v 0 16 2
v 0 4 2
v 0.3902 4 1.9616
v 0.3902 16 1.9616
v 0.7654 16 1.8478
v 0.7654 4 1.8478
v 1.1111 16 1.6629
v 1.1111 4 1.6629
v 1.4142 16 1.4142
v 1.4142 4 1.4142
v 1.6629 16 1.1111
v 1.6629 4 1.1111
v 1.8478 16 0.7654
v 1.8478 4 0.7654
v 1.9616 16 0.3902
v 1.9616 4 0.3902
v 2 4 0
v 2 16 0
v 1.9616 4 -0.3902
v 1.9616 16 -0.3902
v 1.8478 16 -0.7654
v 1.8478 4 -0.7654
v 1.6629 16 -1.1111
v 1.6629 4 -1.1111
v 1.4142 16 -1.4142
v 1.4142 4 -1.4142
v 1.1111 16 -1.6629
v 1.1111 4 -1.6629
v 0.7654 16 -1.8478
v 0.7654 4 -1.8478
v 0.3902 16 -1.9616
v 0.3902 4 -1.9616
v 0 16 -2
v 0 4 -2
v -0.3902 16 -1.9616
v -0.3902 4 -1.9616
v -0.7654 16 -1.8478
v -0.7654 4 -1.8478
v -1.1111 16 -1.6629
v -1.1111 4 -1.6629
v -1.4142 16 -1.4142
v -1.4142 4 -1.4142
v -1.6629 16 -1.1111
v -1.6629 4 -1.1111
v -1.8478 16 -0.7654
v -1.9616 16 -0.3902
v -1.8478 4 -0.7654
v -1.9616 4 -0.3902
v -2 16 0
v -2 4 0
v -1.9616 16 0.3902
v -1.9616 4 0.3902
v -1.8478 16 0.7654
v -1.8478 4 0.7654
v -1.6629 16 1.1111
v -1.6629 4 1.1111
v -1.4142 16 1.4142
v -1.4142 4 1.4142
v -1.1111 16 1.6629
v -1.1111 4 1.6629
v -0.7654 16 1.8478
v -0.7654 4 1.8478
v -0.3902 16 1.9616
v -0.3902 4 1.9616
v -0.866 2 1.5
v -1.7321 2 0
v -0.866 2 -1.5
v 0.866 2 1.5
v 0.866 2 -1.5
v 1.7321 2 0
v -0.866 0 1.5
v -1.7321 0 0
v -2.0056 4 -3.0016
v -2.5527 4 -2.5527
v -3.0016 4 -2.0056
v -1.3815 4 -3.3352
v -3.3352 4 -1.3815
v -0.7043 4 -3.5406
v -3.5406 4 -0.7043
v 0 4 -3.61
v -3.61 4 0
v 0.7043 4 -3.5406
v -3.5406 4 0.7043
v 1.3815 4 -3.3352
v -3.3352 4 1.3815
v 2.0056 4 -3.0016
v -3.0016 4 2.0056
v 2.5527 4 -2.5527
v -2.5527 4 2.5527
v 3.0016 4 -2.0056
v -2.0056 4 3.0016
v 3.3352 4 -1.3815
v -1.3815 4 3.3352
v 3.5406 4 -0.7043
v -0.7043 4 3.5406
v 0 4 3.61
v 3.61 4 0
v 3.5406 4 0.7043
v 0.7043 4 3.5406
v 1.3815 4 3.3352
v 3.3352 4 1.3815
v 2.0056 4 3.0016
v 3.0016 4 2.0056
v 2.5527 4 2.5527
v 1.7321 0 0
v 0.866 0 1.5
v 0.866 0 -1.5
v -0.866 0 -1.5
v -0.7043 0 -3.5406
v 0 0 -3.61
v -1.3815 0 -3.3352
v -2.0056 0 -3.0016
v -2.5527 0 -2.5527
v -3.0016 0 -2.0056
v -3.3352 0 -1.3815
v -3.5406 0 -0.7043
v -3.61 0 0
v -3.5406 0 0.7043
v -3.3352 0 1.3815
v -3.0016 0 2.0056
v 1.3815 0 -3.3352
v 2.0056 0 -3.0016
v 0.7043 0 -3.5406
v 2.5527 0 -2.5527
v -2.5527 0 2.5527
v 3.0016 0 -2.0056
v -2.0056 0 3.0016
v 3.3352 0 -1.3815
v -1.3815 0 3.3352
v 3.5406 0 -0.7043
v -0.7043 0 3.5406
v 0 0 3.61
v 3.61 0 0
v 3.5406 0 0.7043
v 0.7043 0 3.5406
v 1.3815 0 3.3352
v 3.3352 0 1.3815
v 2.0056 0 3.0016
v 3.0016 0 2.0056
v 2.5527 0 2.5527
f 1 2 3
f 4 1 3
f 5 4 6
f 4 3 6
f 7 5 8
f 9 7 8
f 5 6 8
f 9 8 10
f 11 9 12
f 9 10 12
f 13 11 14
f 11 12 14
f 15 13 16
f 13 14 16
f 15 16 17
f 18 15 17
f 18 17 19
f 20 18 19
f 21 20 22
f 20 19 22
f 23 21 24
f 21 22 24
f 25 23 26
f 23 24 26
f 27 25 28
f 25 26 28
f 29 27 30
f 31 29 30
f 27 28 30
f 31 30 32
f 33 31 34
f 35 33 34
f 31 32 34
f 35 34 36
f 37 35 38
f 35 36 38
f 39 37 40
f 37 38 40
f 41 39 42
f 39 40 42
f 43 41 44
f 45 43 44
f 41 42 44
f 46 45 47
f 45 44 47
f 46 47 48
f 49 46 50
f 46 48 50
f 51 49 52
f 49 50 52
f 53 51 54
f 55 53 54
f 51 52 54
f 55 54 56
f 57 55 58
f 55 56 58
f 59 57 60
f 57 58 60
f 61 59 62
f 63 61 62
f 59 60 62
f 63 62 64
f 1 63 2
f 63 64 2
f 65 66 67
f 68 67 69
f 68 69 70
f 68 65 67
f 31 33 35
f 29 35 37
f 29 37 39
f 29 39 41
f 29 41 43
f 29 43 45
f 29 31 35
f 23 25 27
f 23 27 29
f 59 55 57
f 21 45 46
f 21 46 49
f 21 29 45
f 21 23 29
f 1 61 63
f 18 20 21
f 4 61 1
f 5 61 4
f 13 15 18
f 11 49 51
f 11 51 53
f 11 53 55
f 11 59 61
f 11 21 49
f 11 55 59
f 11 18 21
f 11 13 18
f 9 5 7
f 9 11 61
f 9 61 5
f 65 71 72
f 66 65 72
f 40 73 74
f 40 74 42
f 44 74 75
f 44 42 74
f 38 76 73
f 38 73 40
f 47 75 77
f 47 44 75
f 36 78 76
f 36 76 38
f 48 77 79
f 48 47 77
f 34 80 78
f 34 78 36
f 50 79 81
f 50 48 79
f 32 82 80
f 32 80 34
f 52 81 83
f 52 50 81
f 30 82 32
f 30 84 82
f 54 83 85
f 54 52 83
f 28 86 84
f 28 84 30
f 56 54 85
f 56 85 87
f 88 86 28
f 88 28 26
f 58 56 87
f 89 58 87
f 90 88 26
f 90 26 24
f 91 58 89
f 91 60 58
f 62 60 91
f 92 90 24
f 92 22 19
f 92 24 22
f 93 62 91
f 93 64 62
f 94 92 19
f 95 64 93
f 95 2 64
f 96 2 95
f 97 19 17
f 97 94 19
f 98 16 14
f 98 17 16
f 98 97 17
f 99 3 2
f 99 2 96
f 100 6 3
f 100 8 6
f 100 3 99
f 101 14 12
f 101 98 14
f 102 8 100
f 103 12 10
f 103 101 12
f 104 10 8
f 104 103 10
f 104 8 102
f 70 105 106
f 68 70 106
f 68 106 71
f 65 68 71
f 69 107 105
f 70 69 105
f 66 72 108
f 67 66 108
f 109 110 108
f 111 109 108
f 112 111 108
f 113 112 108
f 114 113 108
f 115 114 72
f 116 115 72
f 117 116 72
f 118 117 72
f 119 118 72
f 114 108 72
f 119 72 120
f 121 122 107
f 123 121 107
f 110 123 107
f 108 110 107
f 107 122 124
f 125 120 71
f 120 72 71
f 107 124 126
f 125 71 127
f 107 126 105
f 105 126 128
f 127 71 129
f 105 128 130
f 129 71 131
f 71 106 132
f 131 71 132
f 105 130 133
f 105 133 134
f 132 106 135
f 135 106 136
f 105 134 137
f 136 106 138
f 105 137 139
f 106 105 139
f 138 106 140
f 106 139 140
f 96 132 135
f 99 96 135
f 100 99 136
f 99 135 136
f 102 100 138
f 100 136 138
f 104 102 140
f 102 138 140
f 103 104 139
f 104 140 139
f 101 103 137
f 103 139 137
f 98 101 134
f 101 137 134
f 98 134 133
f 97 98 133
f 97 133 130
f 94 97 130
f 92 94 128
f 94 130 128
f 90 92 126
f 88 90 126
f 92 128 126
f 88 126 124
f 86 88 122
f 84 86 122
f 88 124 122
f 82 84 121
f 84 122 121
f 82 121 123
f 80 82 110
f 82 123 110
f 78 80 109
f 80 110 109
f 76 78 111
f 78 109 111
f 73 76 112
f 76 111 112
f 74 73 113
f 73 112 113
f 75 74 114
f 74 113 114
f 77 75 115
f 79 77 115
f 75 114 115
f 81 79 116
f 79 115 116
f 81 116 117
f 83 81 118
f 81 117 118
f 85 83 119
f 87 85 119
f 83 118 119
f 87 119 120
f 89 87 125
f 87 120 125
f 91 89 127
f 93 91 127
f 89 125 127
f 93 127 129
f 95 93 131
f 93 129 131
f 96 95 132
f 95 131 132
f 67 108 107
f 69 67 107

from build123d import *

# Parameters (mm, degrees)
SKETCH_1_R          = 3.61
EXTRUDE_1_DEPTH     = 4
CUT_EXTRUDE_1_DEPTH = 2
SKETCH_3_R          = 2
EXTRUDE_2_DEPTH     = 12


with BuildPart() as part:
    # 草图1 → 凸台-拉伸1 (new body)
    with BuildSketch(Plane(origin=(0, 0, 0), x_dir=(1, 0, 0), z_dir=(0, 1, 0))):
        Circle(SKETCH_1_R)
    extrude(amount=EXTRUDE_1_DEPTH)

    # 草图2 → 切除-拉伸1 (cut)
    with BuildSketch(Plane.XZ):
        Polygon((1.732050808, 0), (0.866025404, 1.5), (-0.866025404, 1.5), (-1.732050808, 0), (-0.866025404, -1.5), (0.866025404, -1.5), align=None)
    extrude(amount=-CUT_EXTRUDE_1_DEPTH, mode=Mode.SUBTRACT)

    # 草图3 → 凸台-拉伸2 (add)
    with BuildSketch(Plane(origin=(0, 4, 0), x_dir=(1, 0, 0), z_dir=(0, 1, 0))):
        Circle(SKETCH_3_R)
    extrude(amount=EXTRUDE_2_DEPTH)


solid = part.part
